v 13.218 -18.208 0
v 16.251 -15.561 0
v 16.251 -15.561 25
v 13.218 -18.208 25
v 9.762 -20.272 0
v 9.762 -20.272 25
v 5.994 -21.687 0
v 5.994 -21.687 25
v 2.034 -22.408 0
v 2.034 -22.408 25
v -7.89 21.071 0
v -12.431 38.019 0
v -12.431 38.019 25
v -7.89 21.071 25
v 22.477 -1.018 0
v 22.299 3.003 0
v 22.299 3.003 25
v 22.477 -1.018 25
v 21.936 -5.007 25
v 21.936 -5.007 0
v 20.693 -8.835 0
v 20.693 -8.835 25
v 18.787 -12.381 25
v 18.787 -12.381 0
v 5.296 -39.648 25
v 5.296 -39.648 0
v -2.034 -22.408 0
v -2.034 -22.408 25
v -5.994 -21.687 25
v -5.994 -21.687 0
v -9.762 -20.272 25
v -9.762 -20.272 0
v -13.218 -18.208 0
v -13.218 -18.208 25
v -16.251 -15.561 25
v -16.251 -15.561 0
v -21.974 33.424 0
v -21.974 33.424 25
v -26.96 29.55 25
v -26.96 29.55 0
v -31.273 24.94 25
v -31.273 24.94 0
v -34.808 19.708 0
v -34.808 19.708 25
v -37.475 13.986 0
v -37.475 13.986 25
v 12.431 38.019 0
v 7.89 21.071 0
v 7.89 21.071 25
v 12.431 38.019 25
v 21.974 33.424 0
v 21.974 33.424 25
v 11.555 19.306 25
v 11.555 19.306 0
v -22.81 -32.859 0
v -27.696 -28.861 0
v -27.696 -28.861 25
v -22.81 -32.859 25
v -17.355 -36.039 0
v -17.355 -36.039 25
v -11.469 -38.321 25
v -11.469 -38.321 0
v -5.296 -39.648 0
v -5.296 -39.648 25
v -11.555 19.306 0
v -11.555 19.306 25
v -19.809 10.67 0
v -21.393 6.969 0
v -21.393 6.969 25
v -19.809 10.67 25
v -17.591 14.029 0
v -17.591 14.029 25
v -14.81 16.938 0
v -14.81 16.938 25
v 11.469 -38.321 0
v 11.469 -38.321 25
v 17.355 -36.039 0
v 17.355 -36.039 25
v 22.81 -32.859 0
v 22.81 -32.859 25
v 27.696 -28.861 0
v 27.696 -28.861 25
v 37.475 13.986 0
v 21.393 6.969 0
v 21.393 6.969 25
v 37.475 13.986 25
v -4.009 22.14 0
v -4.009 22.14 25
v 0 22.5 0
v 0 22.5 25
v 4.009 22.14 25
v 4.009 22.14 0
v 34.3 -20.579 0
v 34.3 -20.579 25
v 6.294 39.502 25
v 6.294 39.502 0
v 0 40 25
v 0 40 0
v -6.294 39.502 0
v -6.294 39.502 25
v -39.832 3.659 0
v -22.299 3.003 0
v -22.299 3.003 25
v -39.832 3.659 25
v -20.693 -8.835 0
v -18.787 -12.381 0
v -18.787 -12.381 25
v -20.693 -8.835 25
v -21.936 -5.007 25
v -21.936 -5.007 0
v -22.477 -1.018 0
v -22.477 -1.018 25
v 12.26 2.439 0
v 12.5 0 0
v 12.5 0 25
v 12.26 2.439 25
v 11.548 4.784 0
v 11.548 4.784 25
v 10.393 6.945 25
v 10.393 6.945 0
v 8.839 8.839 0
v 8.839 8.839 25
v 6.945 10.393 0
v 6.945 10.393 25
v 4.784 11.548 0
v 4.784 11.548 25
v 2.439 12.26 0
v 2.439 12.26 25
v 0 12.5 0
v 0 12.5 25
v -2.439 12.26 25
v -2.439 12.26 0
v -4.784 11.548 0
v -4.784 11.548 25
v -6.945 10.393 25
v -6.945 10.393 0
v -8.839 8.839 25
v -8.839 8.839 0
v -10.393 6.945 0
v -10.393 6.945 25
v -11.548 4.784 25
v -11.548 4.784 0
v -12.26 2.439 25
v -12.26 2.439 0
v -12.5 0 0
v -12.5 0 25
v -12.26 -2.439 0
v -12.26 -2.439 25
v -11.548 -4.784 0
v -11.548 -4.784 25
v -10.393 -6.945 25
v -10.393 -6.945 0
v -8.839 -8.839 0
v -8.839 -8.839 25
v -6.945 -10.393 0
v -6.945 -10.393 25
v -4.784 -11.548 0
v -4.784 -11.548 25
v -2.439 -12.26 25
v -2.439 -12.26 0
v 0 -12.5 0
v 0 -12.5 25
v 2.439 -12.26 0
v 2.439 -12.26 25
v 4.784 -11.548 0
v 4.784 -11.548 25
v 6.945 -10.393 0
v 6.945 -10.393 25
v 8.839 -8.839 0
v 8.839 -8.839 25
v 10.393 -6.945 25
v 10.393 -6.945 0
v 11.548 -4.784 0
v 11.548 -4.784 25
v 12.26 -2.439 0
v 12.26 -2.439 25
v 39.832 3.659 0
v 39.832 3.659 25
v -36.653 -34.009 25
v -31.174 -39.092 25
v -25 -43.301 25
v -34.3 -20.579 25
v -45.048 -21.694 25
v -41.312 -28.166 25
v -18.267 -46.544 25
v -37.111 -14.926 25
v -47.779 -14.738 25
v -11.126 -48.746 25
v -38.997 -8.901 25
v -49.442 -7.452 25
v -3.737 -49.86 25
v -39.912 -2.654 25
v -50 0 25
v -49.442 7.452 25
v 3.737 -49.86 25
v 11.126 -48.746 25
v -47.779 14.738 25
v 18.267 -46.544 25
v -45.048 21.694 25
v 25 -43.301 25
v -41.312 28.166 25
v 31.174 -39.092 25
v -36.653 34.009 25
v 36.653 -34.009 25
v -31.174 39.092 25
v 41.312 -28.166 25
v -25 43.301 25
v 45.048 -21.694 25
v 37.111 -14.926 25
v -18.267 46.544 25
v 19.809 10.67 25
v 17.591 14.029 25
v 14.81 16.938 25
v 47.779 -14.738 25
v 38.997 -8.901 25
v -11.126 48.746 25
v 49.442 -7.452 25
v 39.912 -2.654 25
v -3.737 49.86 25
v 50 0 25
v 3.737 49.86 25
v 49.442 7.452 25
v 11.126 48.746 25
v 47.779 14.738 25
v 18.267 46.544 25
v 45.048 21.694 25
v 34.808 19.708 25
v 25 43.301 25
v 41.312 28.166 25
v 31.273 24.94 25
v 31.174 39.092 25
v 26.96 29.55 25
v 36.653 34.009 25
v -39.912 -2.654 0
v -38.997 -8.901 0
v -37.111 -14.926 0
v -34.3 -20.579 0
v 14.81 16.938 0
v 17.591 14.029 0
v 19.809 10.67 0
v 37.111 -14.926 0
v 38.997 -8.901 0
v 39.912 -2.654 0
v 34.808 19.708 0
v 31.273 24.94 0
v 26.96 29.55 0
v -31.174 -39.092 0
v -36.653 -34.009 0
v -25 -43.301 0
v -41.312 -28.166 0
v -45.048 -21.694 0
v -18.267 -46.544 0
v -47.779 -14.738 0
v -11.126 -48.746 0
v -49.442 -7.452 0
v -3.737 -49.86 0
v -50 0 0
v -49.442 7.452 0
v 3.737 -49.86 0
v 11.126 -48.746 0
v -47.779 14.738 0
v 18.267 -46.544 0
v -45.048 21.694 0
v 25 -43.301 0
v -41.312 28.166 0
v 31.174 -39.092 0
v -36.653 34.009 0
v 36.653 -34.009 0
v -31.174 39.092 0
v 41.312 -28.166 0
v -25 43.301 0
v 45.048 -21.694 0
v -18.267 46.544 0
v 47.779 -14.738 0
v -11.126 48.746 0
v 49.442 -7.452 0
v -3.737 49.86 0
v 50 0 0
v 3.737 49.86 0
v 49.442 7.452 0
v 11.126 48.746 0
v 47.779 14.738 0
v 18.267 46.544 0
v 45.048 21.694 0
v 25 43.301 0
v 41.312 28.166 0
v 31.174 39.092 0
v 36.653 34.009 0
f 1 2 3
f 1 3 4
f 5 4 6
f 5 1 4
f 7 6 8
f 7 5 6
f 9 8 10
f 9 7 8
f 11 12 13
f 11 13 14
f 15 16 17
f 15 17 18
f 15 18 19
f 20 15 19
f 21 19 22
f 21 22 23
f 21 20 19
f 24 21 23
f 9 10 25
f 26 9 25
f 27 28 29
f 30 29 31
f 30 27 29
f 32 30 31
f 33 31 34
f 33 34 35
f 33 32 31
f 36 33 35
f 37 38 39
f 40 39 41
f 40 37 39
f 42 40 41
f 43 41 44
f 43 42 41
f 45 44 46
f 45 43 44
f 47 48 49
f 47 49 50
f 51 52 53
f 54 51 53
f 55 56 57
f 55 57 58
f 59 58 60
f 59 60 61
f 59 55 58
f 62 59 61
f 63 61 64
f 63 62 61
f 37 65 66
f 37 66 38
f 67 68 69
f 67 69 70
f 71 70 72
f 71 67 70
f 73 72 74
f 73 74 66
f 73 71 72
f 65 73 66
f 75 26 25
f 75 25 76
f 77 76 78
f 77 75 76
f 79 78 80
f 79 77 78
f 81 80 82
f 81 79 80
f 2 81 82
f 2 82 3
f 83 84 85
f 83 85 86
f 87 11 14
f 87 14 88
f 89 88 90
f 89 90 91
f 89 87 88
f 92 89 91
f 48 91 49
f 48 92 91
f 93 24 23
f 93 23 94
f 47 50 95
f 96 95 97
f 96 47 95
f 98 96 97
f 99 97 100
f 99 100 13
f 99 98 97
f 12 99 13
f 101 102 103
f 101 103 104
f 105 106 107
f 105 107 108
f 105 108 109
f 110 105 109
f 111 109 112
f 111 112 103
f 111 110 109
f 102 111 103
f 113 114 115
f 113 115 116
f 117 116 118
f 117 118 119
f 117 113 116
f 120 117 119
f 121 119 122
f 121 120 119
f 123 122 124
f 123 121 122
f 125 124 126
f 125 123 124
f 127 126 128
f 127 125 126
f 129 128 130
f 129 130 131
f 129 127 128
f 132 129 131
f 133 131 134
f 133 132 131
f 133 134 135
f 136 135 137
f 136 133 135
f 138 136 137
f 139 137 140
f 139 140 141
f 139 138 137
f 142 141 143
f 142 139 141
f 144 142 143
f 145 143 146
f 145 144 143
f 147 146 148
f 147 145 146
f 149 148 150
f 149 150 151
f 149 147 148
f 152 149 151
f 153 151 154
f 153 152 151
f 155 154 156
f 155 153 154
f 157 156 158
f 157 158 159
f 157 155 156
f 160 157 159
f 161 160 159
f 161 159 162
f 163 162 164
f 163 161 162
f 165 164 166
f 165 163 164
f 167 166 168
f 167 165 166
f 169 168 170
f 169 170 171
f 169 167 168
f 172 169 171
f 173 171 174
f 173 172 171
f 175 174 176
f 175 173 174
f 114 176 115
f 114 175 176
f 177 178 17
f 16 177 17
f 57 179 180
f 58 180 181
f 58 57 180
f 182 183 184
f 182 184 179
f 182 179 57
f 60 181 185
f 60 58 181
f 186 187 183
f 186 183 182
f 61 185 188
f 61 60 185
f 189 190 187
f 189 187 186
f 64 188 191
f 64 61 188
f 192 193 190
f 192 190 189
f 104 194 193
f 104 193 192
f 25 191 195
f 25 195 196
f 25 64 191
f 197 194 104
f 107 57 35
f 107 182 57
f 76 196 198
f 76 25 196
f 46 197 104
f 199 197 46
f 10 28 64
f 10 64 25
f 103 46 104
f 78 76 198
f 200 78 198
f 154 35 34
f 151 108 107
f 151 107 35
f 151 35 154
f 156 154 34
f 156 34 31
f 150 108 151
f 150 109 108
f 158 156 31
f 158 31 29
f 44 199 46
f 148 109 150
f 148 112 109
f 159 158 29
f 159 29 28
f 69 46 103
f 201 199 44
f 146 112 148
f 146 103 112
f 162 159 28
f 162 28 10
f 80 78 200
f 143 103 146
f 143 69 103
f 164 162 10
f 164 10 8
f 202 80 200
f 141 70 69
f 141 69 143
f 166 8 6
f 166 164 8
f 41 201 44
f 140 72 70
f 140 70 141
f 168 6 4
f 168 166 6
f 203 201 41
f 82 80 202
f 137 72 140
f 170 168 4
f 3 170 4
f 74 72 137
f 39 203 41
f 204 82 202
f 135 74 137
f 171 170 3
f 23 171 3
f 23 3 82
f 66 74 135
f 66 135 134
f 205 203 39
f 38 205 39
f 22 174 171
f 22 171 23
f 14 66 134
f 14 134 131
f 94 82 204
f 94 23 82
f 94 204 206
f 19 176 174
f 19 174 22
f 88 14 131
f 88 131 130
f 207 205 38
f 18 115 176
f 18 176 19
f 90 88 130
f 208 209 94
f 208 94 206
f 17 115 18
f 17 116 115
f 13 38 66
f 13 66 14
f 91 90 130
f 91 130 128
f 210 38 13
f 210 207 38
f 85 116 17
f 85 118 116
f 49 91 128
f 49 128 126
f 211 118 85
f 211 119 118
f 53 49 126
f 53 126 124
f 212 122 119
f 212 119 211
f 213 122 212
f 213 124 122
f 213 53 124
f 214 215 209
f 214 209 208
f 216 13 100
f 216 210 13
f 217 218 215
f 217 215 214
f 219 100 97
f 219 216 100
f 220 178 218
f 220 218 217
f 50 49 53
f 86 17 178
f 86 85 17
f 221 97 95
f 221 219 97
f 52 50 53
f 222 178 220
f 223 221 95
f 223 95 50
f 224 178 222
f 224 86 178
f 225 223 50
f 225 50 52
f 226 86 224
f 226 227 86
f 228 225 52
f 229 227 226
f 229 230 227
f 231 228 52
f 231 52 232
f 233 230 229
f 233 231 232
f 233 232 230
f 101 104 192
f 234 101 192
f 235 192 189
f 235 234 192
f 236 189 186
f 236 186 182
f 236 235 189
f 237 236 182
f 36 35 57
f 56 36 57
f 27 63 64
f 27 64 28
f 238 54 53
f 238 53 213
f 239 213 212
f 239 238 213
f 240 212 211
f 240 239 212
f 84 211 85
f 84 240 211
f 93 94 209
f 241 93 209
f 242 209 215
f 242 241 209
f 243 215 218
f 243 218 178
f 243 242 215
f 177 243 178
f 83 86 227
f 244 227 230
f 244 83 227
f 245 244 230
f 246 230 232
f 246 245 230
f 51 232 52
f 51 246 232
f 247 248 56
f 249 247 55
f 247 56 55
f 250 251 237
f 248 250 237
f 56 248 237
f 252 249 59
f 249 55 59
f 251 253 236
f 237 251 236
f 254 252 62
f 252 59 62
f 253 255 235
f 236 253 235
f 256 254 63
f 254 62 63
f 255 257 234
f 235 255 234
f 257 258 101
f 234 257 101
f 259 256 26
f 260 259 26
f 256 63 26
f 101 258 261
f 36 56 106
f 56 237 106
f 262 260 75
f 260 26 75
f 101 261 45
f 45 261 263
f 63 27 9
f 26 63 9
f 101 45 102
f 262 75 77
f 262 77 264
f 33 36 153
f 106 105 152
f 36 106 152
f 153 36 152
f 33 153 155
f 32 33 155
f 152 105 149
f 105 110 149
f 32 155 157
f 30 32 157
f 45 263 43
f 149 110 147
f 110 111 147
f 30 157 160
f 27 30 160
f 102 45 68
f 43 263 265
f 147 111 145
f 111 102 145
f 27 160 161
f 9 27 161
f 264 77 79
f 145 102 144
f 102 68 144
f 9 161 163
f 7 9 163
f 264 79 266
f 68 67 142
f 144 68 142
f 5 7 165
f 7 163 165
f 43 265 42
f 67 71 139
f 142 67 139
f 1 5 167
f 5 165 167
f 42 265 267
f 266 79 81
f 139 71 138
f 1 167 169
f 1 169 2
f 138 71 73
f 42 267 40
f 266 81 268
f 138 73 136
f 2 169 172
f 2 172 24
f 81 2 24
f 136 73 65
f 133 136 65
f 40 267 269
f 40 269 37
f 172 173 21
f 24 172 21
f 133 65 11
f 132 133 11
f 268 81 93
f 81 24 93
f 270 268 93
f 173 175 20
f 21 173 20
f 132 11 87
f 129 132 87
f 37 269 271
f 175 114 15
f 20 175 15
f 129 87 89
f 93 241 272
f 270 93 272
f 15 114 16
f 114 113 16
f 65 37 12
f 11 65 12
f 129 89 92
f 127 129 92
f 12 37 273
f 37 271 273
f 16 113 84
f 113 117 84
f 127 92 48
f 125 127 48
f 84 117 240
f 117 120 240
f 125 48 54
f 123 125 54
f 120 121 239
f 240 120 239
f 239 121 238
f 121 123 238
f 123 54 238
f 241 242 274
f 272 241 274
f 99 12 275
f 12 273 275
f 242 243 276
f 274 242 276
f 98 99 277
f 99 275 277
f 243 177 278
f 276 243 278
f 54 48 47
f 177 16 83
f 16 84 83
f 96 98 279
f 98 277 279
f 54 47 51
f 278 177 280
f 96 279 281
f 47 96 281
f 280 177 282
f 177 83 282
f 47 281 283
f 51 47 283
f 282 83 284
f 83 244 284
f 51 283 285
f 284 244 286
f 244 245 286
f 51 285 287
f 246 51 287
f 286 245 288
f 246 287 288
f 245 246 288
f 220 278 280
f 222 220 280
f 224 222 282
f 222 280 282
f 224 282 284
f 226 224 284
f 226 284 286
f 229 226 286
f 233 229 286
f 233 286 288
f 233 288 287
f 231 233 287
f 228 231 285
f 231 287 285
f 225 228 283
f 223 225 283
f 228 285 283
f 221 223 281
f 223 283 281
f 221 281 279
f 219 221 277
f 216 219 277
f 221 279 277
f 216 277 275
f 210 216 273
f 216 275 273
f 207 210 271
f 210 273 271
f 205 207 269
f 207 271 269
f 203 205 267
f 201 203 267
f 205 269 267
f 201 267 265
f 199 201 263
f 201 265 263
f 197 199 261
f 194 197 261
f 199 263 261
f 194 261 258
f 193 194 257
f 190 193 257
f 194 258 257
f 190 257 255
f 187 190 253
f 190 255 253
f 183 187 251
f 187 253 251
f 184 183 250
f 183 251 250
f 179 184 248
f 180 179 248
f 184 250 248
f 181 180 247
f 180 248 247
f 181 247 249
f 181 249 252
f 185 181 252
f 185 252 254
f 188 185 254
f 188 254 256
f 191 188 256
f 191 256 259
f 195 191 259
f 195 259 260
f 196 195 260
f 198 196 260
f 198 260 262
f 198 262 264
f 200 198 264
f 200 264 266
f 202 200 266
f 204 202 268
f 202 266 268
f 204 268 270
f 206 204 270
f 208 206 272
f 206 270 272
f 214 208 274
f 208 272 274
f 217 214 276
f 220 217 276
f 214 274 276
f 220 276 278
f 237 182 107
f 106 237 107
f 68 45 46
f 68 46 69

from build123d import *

# Parameters (mm, degrees)
SKETCH1_R           = 50
SKETCH1_R_2         = 12.5
BOSS_EXTRUDE1_DEPTH = 25


with BuildPart() as part:
    # Sketch1 → Boss-Extrude1 (new body)
    with BuildSketch(Plane.XY):
        Circle(SKETCH1_R)
        Circle(SKETCH1_R_2, mode=Mode.SUBTRACT)
        with BuildLine():
            Line((7.8897322, 21.071357949), (12.430935999, 38.019361254))
            ThreePointArc((12.430935999, 38.019361254), (0, 40), (-12.430935999, 38.019361254))
            Line((-12.430935999, 38.019361254), (-7.8897322, 21.071357949))
            ThreePointArc((-7.8897322, 21.071357949), (0, 22.5), (7.8897322, 21.071357949))
        make_face(mode=Mode.SUBTRACT)
        with BuildLine():
            Line((21.393418589, 6.96933577), (37.475295395, 13.985786895))
            ThreePointArc((37.475295395, 13.985786895), (31.273259299, 24.939592074), (21.974171749, 33.423581136))
            Line((21.974171749, 33.423581136), (11.555083457, 19.306217815))
            ThreePointArc((11.555083457, 19.306217815), (17.591208356, 14.028520542), (21.393418589, 6.96933577))
        make_face(mode=Mode.SUBTRACT)
        with BuildLine():
            Line((18.787424434, -12.380738392), (34.299993002, -20.579370255))
            ThreePointArc((34.299993002, -20.579370255), (38.997116487, -8.900837358), (39.832279979, 3.659162705))
            Line((39.832279979, 3.659162705), (22.29868559, 3.003101891))
            ThreePointArc((22.29868559, 3.003101891), (21.935878024, -5.006721014), (18.787424434, -12.380738392))
        make_face(mode=Mode.SUBTRACT)
        with BuildLine():
            Line((2.034116487, -22.407864024), (5.296096286, -39.64784186))
            ThreePointArc((5.296096286, -39.64784186), (17.355349565, -36.038754716), (27.695868954, -28.860679876))
            Line((27.695868954, -28.860679876), (16.250922663, -15.561411009))
            ThreePointArc((16.250922663, -15.561411009), (9.76238413, -20.271799528), (2.034116487, -22.407864024))
        make_face(mode=Mode.SUBTRACT)
        with BuildLine():
            Line((-16.250922663, -15.561411009), (-27.695868954, -28.860679876))
            ThreePointArc((-27.695868954, -28.860679876), (-17.355349565, -36.038754716), (-5.296096286, -39.64784186))
            Line((-5.296096286, -39.64784186), (-2.034116487, -22.407864024))
            ThreePointArc((-2.034116487, -22.407864024), (-9.76238413, -20.271799528), (-16.250922663, -15.561411009))
        make_face(mode=Mode.SUBTRACT)
        with BuildLine():
            Line((-22.29868559, 3.003101891), (-39.832279979, 3.659162705))
            ThreePointArc((-39.832279979, 3.659162705), (-38.997116487, -8.900837358), (-34.299993002, -20.579370255))
            Line((-34.299993002, -20.579370255), (-18.787424434, -12.380738392))
            ThreePointArc((-18.787424434, -12.380738392), (-21.935878024, -5.006721014), (-22.29868559, 3.003101891))
        make_face(mode=Mode.SUBTRACT)
        with BuildLine():
            Line((-11.555083457, 19.306217815), (-21.974171749, 33.423581136))
            ThreePointArc((-21.974171749, 33.423581136), (-31.273259299, 24.939592074), (-37.475295395, 13.985786895))
            Line((-37.475295395, 13.985786895), (-21.393418589, 6.96933577))
            ThreePointArc((-21.393418589, 6.96933577), (-17.591208356, 14.028520542), (-11.555083457, 19.306217815))
        make_face(mode=Mode.SUBTRACT)
    extrude(amount=BOSS_EXTRUDE1_DEPTH)


solid = part.part
